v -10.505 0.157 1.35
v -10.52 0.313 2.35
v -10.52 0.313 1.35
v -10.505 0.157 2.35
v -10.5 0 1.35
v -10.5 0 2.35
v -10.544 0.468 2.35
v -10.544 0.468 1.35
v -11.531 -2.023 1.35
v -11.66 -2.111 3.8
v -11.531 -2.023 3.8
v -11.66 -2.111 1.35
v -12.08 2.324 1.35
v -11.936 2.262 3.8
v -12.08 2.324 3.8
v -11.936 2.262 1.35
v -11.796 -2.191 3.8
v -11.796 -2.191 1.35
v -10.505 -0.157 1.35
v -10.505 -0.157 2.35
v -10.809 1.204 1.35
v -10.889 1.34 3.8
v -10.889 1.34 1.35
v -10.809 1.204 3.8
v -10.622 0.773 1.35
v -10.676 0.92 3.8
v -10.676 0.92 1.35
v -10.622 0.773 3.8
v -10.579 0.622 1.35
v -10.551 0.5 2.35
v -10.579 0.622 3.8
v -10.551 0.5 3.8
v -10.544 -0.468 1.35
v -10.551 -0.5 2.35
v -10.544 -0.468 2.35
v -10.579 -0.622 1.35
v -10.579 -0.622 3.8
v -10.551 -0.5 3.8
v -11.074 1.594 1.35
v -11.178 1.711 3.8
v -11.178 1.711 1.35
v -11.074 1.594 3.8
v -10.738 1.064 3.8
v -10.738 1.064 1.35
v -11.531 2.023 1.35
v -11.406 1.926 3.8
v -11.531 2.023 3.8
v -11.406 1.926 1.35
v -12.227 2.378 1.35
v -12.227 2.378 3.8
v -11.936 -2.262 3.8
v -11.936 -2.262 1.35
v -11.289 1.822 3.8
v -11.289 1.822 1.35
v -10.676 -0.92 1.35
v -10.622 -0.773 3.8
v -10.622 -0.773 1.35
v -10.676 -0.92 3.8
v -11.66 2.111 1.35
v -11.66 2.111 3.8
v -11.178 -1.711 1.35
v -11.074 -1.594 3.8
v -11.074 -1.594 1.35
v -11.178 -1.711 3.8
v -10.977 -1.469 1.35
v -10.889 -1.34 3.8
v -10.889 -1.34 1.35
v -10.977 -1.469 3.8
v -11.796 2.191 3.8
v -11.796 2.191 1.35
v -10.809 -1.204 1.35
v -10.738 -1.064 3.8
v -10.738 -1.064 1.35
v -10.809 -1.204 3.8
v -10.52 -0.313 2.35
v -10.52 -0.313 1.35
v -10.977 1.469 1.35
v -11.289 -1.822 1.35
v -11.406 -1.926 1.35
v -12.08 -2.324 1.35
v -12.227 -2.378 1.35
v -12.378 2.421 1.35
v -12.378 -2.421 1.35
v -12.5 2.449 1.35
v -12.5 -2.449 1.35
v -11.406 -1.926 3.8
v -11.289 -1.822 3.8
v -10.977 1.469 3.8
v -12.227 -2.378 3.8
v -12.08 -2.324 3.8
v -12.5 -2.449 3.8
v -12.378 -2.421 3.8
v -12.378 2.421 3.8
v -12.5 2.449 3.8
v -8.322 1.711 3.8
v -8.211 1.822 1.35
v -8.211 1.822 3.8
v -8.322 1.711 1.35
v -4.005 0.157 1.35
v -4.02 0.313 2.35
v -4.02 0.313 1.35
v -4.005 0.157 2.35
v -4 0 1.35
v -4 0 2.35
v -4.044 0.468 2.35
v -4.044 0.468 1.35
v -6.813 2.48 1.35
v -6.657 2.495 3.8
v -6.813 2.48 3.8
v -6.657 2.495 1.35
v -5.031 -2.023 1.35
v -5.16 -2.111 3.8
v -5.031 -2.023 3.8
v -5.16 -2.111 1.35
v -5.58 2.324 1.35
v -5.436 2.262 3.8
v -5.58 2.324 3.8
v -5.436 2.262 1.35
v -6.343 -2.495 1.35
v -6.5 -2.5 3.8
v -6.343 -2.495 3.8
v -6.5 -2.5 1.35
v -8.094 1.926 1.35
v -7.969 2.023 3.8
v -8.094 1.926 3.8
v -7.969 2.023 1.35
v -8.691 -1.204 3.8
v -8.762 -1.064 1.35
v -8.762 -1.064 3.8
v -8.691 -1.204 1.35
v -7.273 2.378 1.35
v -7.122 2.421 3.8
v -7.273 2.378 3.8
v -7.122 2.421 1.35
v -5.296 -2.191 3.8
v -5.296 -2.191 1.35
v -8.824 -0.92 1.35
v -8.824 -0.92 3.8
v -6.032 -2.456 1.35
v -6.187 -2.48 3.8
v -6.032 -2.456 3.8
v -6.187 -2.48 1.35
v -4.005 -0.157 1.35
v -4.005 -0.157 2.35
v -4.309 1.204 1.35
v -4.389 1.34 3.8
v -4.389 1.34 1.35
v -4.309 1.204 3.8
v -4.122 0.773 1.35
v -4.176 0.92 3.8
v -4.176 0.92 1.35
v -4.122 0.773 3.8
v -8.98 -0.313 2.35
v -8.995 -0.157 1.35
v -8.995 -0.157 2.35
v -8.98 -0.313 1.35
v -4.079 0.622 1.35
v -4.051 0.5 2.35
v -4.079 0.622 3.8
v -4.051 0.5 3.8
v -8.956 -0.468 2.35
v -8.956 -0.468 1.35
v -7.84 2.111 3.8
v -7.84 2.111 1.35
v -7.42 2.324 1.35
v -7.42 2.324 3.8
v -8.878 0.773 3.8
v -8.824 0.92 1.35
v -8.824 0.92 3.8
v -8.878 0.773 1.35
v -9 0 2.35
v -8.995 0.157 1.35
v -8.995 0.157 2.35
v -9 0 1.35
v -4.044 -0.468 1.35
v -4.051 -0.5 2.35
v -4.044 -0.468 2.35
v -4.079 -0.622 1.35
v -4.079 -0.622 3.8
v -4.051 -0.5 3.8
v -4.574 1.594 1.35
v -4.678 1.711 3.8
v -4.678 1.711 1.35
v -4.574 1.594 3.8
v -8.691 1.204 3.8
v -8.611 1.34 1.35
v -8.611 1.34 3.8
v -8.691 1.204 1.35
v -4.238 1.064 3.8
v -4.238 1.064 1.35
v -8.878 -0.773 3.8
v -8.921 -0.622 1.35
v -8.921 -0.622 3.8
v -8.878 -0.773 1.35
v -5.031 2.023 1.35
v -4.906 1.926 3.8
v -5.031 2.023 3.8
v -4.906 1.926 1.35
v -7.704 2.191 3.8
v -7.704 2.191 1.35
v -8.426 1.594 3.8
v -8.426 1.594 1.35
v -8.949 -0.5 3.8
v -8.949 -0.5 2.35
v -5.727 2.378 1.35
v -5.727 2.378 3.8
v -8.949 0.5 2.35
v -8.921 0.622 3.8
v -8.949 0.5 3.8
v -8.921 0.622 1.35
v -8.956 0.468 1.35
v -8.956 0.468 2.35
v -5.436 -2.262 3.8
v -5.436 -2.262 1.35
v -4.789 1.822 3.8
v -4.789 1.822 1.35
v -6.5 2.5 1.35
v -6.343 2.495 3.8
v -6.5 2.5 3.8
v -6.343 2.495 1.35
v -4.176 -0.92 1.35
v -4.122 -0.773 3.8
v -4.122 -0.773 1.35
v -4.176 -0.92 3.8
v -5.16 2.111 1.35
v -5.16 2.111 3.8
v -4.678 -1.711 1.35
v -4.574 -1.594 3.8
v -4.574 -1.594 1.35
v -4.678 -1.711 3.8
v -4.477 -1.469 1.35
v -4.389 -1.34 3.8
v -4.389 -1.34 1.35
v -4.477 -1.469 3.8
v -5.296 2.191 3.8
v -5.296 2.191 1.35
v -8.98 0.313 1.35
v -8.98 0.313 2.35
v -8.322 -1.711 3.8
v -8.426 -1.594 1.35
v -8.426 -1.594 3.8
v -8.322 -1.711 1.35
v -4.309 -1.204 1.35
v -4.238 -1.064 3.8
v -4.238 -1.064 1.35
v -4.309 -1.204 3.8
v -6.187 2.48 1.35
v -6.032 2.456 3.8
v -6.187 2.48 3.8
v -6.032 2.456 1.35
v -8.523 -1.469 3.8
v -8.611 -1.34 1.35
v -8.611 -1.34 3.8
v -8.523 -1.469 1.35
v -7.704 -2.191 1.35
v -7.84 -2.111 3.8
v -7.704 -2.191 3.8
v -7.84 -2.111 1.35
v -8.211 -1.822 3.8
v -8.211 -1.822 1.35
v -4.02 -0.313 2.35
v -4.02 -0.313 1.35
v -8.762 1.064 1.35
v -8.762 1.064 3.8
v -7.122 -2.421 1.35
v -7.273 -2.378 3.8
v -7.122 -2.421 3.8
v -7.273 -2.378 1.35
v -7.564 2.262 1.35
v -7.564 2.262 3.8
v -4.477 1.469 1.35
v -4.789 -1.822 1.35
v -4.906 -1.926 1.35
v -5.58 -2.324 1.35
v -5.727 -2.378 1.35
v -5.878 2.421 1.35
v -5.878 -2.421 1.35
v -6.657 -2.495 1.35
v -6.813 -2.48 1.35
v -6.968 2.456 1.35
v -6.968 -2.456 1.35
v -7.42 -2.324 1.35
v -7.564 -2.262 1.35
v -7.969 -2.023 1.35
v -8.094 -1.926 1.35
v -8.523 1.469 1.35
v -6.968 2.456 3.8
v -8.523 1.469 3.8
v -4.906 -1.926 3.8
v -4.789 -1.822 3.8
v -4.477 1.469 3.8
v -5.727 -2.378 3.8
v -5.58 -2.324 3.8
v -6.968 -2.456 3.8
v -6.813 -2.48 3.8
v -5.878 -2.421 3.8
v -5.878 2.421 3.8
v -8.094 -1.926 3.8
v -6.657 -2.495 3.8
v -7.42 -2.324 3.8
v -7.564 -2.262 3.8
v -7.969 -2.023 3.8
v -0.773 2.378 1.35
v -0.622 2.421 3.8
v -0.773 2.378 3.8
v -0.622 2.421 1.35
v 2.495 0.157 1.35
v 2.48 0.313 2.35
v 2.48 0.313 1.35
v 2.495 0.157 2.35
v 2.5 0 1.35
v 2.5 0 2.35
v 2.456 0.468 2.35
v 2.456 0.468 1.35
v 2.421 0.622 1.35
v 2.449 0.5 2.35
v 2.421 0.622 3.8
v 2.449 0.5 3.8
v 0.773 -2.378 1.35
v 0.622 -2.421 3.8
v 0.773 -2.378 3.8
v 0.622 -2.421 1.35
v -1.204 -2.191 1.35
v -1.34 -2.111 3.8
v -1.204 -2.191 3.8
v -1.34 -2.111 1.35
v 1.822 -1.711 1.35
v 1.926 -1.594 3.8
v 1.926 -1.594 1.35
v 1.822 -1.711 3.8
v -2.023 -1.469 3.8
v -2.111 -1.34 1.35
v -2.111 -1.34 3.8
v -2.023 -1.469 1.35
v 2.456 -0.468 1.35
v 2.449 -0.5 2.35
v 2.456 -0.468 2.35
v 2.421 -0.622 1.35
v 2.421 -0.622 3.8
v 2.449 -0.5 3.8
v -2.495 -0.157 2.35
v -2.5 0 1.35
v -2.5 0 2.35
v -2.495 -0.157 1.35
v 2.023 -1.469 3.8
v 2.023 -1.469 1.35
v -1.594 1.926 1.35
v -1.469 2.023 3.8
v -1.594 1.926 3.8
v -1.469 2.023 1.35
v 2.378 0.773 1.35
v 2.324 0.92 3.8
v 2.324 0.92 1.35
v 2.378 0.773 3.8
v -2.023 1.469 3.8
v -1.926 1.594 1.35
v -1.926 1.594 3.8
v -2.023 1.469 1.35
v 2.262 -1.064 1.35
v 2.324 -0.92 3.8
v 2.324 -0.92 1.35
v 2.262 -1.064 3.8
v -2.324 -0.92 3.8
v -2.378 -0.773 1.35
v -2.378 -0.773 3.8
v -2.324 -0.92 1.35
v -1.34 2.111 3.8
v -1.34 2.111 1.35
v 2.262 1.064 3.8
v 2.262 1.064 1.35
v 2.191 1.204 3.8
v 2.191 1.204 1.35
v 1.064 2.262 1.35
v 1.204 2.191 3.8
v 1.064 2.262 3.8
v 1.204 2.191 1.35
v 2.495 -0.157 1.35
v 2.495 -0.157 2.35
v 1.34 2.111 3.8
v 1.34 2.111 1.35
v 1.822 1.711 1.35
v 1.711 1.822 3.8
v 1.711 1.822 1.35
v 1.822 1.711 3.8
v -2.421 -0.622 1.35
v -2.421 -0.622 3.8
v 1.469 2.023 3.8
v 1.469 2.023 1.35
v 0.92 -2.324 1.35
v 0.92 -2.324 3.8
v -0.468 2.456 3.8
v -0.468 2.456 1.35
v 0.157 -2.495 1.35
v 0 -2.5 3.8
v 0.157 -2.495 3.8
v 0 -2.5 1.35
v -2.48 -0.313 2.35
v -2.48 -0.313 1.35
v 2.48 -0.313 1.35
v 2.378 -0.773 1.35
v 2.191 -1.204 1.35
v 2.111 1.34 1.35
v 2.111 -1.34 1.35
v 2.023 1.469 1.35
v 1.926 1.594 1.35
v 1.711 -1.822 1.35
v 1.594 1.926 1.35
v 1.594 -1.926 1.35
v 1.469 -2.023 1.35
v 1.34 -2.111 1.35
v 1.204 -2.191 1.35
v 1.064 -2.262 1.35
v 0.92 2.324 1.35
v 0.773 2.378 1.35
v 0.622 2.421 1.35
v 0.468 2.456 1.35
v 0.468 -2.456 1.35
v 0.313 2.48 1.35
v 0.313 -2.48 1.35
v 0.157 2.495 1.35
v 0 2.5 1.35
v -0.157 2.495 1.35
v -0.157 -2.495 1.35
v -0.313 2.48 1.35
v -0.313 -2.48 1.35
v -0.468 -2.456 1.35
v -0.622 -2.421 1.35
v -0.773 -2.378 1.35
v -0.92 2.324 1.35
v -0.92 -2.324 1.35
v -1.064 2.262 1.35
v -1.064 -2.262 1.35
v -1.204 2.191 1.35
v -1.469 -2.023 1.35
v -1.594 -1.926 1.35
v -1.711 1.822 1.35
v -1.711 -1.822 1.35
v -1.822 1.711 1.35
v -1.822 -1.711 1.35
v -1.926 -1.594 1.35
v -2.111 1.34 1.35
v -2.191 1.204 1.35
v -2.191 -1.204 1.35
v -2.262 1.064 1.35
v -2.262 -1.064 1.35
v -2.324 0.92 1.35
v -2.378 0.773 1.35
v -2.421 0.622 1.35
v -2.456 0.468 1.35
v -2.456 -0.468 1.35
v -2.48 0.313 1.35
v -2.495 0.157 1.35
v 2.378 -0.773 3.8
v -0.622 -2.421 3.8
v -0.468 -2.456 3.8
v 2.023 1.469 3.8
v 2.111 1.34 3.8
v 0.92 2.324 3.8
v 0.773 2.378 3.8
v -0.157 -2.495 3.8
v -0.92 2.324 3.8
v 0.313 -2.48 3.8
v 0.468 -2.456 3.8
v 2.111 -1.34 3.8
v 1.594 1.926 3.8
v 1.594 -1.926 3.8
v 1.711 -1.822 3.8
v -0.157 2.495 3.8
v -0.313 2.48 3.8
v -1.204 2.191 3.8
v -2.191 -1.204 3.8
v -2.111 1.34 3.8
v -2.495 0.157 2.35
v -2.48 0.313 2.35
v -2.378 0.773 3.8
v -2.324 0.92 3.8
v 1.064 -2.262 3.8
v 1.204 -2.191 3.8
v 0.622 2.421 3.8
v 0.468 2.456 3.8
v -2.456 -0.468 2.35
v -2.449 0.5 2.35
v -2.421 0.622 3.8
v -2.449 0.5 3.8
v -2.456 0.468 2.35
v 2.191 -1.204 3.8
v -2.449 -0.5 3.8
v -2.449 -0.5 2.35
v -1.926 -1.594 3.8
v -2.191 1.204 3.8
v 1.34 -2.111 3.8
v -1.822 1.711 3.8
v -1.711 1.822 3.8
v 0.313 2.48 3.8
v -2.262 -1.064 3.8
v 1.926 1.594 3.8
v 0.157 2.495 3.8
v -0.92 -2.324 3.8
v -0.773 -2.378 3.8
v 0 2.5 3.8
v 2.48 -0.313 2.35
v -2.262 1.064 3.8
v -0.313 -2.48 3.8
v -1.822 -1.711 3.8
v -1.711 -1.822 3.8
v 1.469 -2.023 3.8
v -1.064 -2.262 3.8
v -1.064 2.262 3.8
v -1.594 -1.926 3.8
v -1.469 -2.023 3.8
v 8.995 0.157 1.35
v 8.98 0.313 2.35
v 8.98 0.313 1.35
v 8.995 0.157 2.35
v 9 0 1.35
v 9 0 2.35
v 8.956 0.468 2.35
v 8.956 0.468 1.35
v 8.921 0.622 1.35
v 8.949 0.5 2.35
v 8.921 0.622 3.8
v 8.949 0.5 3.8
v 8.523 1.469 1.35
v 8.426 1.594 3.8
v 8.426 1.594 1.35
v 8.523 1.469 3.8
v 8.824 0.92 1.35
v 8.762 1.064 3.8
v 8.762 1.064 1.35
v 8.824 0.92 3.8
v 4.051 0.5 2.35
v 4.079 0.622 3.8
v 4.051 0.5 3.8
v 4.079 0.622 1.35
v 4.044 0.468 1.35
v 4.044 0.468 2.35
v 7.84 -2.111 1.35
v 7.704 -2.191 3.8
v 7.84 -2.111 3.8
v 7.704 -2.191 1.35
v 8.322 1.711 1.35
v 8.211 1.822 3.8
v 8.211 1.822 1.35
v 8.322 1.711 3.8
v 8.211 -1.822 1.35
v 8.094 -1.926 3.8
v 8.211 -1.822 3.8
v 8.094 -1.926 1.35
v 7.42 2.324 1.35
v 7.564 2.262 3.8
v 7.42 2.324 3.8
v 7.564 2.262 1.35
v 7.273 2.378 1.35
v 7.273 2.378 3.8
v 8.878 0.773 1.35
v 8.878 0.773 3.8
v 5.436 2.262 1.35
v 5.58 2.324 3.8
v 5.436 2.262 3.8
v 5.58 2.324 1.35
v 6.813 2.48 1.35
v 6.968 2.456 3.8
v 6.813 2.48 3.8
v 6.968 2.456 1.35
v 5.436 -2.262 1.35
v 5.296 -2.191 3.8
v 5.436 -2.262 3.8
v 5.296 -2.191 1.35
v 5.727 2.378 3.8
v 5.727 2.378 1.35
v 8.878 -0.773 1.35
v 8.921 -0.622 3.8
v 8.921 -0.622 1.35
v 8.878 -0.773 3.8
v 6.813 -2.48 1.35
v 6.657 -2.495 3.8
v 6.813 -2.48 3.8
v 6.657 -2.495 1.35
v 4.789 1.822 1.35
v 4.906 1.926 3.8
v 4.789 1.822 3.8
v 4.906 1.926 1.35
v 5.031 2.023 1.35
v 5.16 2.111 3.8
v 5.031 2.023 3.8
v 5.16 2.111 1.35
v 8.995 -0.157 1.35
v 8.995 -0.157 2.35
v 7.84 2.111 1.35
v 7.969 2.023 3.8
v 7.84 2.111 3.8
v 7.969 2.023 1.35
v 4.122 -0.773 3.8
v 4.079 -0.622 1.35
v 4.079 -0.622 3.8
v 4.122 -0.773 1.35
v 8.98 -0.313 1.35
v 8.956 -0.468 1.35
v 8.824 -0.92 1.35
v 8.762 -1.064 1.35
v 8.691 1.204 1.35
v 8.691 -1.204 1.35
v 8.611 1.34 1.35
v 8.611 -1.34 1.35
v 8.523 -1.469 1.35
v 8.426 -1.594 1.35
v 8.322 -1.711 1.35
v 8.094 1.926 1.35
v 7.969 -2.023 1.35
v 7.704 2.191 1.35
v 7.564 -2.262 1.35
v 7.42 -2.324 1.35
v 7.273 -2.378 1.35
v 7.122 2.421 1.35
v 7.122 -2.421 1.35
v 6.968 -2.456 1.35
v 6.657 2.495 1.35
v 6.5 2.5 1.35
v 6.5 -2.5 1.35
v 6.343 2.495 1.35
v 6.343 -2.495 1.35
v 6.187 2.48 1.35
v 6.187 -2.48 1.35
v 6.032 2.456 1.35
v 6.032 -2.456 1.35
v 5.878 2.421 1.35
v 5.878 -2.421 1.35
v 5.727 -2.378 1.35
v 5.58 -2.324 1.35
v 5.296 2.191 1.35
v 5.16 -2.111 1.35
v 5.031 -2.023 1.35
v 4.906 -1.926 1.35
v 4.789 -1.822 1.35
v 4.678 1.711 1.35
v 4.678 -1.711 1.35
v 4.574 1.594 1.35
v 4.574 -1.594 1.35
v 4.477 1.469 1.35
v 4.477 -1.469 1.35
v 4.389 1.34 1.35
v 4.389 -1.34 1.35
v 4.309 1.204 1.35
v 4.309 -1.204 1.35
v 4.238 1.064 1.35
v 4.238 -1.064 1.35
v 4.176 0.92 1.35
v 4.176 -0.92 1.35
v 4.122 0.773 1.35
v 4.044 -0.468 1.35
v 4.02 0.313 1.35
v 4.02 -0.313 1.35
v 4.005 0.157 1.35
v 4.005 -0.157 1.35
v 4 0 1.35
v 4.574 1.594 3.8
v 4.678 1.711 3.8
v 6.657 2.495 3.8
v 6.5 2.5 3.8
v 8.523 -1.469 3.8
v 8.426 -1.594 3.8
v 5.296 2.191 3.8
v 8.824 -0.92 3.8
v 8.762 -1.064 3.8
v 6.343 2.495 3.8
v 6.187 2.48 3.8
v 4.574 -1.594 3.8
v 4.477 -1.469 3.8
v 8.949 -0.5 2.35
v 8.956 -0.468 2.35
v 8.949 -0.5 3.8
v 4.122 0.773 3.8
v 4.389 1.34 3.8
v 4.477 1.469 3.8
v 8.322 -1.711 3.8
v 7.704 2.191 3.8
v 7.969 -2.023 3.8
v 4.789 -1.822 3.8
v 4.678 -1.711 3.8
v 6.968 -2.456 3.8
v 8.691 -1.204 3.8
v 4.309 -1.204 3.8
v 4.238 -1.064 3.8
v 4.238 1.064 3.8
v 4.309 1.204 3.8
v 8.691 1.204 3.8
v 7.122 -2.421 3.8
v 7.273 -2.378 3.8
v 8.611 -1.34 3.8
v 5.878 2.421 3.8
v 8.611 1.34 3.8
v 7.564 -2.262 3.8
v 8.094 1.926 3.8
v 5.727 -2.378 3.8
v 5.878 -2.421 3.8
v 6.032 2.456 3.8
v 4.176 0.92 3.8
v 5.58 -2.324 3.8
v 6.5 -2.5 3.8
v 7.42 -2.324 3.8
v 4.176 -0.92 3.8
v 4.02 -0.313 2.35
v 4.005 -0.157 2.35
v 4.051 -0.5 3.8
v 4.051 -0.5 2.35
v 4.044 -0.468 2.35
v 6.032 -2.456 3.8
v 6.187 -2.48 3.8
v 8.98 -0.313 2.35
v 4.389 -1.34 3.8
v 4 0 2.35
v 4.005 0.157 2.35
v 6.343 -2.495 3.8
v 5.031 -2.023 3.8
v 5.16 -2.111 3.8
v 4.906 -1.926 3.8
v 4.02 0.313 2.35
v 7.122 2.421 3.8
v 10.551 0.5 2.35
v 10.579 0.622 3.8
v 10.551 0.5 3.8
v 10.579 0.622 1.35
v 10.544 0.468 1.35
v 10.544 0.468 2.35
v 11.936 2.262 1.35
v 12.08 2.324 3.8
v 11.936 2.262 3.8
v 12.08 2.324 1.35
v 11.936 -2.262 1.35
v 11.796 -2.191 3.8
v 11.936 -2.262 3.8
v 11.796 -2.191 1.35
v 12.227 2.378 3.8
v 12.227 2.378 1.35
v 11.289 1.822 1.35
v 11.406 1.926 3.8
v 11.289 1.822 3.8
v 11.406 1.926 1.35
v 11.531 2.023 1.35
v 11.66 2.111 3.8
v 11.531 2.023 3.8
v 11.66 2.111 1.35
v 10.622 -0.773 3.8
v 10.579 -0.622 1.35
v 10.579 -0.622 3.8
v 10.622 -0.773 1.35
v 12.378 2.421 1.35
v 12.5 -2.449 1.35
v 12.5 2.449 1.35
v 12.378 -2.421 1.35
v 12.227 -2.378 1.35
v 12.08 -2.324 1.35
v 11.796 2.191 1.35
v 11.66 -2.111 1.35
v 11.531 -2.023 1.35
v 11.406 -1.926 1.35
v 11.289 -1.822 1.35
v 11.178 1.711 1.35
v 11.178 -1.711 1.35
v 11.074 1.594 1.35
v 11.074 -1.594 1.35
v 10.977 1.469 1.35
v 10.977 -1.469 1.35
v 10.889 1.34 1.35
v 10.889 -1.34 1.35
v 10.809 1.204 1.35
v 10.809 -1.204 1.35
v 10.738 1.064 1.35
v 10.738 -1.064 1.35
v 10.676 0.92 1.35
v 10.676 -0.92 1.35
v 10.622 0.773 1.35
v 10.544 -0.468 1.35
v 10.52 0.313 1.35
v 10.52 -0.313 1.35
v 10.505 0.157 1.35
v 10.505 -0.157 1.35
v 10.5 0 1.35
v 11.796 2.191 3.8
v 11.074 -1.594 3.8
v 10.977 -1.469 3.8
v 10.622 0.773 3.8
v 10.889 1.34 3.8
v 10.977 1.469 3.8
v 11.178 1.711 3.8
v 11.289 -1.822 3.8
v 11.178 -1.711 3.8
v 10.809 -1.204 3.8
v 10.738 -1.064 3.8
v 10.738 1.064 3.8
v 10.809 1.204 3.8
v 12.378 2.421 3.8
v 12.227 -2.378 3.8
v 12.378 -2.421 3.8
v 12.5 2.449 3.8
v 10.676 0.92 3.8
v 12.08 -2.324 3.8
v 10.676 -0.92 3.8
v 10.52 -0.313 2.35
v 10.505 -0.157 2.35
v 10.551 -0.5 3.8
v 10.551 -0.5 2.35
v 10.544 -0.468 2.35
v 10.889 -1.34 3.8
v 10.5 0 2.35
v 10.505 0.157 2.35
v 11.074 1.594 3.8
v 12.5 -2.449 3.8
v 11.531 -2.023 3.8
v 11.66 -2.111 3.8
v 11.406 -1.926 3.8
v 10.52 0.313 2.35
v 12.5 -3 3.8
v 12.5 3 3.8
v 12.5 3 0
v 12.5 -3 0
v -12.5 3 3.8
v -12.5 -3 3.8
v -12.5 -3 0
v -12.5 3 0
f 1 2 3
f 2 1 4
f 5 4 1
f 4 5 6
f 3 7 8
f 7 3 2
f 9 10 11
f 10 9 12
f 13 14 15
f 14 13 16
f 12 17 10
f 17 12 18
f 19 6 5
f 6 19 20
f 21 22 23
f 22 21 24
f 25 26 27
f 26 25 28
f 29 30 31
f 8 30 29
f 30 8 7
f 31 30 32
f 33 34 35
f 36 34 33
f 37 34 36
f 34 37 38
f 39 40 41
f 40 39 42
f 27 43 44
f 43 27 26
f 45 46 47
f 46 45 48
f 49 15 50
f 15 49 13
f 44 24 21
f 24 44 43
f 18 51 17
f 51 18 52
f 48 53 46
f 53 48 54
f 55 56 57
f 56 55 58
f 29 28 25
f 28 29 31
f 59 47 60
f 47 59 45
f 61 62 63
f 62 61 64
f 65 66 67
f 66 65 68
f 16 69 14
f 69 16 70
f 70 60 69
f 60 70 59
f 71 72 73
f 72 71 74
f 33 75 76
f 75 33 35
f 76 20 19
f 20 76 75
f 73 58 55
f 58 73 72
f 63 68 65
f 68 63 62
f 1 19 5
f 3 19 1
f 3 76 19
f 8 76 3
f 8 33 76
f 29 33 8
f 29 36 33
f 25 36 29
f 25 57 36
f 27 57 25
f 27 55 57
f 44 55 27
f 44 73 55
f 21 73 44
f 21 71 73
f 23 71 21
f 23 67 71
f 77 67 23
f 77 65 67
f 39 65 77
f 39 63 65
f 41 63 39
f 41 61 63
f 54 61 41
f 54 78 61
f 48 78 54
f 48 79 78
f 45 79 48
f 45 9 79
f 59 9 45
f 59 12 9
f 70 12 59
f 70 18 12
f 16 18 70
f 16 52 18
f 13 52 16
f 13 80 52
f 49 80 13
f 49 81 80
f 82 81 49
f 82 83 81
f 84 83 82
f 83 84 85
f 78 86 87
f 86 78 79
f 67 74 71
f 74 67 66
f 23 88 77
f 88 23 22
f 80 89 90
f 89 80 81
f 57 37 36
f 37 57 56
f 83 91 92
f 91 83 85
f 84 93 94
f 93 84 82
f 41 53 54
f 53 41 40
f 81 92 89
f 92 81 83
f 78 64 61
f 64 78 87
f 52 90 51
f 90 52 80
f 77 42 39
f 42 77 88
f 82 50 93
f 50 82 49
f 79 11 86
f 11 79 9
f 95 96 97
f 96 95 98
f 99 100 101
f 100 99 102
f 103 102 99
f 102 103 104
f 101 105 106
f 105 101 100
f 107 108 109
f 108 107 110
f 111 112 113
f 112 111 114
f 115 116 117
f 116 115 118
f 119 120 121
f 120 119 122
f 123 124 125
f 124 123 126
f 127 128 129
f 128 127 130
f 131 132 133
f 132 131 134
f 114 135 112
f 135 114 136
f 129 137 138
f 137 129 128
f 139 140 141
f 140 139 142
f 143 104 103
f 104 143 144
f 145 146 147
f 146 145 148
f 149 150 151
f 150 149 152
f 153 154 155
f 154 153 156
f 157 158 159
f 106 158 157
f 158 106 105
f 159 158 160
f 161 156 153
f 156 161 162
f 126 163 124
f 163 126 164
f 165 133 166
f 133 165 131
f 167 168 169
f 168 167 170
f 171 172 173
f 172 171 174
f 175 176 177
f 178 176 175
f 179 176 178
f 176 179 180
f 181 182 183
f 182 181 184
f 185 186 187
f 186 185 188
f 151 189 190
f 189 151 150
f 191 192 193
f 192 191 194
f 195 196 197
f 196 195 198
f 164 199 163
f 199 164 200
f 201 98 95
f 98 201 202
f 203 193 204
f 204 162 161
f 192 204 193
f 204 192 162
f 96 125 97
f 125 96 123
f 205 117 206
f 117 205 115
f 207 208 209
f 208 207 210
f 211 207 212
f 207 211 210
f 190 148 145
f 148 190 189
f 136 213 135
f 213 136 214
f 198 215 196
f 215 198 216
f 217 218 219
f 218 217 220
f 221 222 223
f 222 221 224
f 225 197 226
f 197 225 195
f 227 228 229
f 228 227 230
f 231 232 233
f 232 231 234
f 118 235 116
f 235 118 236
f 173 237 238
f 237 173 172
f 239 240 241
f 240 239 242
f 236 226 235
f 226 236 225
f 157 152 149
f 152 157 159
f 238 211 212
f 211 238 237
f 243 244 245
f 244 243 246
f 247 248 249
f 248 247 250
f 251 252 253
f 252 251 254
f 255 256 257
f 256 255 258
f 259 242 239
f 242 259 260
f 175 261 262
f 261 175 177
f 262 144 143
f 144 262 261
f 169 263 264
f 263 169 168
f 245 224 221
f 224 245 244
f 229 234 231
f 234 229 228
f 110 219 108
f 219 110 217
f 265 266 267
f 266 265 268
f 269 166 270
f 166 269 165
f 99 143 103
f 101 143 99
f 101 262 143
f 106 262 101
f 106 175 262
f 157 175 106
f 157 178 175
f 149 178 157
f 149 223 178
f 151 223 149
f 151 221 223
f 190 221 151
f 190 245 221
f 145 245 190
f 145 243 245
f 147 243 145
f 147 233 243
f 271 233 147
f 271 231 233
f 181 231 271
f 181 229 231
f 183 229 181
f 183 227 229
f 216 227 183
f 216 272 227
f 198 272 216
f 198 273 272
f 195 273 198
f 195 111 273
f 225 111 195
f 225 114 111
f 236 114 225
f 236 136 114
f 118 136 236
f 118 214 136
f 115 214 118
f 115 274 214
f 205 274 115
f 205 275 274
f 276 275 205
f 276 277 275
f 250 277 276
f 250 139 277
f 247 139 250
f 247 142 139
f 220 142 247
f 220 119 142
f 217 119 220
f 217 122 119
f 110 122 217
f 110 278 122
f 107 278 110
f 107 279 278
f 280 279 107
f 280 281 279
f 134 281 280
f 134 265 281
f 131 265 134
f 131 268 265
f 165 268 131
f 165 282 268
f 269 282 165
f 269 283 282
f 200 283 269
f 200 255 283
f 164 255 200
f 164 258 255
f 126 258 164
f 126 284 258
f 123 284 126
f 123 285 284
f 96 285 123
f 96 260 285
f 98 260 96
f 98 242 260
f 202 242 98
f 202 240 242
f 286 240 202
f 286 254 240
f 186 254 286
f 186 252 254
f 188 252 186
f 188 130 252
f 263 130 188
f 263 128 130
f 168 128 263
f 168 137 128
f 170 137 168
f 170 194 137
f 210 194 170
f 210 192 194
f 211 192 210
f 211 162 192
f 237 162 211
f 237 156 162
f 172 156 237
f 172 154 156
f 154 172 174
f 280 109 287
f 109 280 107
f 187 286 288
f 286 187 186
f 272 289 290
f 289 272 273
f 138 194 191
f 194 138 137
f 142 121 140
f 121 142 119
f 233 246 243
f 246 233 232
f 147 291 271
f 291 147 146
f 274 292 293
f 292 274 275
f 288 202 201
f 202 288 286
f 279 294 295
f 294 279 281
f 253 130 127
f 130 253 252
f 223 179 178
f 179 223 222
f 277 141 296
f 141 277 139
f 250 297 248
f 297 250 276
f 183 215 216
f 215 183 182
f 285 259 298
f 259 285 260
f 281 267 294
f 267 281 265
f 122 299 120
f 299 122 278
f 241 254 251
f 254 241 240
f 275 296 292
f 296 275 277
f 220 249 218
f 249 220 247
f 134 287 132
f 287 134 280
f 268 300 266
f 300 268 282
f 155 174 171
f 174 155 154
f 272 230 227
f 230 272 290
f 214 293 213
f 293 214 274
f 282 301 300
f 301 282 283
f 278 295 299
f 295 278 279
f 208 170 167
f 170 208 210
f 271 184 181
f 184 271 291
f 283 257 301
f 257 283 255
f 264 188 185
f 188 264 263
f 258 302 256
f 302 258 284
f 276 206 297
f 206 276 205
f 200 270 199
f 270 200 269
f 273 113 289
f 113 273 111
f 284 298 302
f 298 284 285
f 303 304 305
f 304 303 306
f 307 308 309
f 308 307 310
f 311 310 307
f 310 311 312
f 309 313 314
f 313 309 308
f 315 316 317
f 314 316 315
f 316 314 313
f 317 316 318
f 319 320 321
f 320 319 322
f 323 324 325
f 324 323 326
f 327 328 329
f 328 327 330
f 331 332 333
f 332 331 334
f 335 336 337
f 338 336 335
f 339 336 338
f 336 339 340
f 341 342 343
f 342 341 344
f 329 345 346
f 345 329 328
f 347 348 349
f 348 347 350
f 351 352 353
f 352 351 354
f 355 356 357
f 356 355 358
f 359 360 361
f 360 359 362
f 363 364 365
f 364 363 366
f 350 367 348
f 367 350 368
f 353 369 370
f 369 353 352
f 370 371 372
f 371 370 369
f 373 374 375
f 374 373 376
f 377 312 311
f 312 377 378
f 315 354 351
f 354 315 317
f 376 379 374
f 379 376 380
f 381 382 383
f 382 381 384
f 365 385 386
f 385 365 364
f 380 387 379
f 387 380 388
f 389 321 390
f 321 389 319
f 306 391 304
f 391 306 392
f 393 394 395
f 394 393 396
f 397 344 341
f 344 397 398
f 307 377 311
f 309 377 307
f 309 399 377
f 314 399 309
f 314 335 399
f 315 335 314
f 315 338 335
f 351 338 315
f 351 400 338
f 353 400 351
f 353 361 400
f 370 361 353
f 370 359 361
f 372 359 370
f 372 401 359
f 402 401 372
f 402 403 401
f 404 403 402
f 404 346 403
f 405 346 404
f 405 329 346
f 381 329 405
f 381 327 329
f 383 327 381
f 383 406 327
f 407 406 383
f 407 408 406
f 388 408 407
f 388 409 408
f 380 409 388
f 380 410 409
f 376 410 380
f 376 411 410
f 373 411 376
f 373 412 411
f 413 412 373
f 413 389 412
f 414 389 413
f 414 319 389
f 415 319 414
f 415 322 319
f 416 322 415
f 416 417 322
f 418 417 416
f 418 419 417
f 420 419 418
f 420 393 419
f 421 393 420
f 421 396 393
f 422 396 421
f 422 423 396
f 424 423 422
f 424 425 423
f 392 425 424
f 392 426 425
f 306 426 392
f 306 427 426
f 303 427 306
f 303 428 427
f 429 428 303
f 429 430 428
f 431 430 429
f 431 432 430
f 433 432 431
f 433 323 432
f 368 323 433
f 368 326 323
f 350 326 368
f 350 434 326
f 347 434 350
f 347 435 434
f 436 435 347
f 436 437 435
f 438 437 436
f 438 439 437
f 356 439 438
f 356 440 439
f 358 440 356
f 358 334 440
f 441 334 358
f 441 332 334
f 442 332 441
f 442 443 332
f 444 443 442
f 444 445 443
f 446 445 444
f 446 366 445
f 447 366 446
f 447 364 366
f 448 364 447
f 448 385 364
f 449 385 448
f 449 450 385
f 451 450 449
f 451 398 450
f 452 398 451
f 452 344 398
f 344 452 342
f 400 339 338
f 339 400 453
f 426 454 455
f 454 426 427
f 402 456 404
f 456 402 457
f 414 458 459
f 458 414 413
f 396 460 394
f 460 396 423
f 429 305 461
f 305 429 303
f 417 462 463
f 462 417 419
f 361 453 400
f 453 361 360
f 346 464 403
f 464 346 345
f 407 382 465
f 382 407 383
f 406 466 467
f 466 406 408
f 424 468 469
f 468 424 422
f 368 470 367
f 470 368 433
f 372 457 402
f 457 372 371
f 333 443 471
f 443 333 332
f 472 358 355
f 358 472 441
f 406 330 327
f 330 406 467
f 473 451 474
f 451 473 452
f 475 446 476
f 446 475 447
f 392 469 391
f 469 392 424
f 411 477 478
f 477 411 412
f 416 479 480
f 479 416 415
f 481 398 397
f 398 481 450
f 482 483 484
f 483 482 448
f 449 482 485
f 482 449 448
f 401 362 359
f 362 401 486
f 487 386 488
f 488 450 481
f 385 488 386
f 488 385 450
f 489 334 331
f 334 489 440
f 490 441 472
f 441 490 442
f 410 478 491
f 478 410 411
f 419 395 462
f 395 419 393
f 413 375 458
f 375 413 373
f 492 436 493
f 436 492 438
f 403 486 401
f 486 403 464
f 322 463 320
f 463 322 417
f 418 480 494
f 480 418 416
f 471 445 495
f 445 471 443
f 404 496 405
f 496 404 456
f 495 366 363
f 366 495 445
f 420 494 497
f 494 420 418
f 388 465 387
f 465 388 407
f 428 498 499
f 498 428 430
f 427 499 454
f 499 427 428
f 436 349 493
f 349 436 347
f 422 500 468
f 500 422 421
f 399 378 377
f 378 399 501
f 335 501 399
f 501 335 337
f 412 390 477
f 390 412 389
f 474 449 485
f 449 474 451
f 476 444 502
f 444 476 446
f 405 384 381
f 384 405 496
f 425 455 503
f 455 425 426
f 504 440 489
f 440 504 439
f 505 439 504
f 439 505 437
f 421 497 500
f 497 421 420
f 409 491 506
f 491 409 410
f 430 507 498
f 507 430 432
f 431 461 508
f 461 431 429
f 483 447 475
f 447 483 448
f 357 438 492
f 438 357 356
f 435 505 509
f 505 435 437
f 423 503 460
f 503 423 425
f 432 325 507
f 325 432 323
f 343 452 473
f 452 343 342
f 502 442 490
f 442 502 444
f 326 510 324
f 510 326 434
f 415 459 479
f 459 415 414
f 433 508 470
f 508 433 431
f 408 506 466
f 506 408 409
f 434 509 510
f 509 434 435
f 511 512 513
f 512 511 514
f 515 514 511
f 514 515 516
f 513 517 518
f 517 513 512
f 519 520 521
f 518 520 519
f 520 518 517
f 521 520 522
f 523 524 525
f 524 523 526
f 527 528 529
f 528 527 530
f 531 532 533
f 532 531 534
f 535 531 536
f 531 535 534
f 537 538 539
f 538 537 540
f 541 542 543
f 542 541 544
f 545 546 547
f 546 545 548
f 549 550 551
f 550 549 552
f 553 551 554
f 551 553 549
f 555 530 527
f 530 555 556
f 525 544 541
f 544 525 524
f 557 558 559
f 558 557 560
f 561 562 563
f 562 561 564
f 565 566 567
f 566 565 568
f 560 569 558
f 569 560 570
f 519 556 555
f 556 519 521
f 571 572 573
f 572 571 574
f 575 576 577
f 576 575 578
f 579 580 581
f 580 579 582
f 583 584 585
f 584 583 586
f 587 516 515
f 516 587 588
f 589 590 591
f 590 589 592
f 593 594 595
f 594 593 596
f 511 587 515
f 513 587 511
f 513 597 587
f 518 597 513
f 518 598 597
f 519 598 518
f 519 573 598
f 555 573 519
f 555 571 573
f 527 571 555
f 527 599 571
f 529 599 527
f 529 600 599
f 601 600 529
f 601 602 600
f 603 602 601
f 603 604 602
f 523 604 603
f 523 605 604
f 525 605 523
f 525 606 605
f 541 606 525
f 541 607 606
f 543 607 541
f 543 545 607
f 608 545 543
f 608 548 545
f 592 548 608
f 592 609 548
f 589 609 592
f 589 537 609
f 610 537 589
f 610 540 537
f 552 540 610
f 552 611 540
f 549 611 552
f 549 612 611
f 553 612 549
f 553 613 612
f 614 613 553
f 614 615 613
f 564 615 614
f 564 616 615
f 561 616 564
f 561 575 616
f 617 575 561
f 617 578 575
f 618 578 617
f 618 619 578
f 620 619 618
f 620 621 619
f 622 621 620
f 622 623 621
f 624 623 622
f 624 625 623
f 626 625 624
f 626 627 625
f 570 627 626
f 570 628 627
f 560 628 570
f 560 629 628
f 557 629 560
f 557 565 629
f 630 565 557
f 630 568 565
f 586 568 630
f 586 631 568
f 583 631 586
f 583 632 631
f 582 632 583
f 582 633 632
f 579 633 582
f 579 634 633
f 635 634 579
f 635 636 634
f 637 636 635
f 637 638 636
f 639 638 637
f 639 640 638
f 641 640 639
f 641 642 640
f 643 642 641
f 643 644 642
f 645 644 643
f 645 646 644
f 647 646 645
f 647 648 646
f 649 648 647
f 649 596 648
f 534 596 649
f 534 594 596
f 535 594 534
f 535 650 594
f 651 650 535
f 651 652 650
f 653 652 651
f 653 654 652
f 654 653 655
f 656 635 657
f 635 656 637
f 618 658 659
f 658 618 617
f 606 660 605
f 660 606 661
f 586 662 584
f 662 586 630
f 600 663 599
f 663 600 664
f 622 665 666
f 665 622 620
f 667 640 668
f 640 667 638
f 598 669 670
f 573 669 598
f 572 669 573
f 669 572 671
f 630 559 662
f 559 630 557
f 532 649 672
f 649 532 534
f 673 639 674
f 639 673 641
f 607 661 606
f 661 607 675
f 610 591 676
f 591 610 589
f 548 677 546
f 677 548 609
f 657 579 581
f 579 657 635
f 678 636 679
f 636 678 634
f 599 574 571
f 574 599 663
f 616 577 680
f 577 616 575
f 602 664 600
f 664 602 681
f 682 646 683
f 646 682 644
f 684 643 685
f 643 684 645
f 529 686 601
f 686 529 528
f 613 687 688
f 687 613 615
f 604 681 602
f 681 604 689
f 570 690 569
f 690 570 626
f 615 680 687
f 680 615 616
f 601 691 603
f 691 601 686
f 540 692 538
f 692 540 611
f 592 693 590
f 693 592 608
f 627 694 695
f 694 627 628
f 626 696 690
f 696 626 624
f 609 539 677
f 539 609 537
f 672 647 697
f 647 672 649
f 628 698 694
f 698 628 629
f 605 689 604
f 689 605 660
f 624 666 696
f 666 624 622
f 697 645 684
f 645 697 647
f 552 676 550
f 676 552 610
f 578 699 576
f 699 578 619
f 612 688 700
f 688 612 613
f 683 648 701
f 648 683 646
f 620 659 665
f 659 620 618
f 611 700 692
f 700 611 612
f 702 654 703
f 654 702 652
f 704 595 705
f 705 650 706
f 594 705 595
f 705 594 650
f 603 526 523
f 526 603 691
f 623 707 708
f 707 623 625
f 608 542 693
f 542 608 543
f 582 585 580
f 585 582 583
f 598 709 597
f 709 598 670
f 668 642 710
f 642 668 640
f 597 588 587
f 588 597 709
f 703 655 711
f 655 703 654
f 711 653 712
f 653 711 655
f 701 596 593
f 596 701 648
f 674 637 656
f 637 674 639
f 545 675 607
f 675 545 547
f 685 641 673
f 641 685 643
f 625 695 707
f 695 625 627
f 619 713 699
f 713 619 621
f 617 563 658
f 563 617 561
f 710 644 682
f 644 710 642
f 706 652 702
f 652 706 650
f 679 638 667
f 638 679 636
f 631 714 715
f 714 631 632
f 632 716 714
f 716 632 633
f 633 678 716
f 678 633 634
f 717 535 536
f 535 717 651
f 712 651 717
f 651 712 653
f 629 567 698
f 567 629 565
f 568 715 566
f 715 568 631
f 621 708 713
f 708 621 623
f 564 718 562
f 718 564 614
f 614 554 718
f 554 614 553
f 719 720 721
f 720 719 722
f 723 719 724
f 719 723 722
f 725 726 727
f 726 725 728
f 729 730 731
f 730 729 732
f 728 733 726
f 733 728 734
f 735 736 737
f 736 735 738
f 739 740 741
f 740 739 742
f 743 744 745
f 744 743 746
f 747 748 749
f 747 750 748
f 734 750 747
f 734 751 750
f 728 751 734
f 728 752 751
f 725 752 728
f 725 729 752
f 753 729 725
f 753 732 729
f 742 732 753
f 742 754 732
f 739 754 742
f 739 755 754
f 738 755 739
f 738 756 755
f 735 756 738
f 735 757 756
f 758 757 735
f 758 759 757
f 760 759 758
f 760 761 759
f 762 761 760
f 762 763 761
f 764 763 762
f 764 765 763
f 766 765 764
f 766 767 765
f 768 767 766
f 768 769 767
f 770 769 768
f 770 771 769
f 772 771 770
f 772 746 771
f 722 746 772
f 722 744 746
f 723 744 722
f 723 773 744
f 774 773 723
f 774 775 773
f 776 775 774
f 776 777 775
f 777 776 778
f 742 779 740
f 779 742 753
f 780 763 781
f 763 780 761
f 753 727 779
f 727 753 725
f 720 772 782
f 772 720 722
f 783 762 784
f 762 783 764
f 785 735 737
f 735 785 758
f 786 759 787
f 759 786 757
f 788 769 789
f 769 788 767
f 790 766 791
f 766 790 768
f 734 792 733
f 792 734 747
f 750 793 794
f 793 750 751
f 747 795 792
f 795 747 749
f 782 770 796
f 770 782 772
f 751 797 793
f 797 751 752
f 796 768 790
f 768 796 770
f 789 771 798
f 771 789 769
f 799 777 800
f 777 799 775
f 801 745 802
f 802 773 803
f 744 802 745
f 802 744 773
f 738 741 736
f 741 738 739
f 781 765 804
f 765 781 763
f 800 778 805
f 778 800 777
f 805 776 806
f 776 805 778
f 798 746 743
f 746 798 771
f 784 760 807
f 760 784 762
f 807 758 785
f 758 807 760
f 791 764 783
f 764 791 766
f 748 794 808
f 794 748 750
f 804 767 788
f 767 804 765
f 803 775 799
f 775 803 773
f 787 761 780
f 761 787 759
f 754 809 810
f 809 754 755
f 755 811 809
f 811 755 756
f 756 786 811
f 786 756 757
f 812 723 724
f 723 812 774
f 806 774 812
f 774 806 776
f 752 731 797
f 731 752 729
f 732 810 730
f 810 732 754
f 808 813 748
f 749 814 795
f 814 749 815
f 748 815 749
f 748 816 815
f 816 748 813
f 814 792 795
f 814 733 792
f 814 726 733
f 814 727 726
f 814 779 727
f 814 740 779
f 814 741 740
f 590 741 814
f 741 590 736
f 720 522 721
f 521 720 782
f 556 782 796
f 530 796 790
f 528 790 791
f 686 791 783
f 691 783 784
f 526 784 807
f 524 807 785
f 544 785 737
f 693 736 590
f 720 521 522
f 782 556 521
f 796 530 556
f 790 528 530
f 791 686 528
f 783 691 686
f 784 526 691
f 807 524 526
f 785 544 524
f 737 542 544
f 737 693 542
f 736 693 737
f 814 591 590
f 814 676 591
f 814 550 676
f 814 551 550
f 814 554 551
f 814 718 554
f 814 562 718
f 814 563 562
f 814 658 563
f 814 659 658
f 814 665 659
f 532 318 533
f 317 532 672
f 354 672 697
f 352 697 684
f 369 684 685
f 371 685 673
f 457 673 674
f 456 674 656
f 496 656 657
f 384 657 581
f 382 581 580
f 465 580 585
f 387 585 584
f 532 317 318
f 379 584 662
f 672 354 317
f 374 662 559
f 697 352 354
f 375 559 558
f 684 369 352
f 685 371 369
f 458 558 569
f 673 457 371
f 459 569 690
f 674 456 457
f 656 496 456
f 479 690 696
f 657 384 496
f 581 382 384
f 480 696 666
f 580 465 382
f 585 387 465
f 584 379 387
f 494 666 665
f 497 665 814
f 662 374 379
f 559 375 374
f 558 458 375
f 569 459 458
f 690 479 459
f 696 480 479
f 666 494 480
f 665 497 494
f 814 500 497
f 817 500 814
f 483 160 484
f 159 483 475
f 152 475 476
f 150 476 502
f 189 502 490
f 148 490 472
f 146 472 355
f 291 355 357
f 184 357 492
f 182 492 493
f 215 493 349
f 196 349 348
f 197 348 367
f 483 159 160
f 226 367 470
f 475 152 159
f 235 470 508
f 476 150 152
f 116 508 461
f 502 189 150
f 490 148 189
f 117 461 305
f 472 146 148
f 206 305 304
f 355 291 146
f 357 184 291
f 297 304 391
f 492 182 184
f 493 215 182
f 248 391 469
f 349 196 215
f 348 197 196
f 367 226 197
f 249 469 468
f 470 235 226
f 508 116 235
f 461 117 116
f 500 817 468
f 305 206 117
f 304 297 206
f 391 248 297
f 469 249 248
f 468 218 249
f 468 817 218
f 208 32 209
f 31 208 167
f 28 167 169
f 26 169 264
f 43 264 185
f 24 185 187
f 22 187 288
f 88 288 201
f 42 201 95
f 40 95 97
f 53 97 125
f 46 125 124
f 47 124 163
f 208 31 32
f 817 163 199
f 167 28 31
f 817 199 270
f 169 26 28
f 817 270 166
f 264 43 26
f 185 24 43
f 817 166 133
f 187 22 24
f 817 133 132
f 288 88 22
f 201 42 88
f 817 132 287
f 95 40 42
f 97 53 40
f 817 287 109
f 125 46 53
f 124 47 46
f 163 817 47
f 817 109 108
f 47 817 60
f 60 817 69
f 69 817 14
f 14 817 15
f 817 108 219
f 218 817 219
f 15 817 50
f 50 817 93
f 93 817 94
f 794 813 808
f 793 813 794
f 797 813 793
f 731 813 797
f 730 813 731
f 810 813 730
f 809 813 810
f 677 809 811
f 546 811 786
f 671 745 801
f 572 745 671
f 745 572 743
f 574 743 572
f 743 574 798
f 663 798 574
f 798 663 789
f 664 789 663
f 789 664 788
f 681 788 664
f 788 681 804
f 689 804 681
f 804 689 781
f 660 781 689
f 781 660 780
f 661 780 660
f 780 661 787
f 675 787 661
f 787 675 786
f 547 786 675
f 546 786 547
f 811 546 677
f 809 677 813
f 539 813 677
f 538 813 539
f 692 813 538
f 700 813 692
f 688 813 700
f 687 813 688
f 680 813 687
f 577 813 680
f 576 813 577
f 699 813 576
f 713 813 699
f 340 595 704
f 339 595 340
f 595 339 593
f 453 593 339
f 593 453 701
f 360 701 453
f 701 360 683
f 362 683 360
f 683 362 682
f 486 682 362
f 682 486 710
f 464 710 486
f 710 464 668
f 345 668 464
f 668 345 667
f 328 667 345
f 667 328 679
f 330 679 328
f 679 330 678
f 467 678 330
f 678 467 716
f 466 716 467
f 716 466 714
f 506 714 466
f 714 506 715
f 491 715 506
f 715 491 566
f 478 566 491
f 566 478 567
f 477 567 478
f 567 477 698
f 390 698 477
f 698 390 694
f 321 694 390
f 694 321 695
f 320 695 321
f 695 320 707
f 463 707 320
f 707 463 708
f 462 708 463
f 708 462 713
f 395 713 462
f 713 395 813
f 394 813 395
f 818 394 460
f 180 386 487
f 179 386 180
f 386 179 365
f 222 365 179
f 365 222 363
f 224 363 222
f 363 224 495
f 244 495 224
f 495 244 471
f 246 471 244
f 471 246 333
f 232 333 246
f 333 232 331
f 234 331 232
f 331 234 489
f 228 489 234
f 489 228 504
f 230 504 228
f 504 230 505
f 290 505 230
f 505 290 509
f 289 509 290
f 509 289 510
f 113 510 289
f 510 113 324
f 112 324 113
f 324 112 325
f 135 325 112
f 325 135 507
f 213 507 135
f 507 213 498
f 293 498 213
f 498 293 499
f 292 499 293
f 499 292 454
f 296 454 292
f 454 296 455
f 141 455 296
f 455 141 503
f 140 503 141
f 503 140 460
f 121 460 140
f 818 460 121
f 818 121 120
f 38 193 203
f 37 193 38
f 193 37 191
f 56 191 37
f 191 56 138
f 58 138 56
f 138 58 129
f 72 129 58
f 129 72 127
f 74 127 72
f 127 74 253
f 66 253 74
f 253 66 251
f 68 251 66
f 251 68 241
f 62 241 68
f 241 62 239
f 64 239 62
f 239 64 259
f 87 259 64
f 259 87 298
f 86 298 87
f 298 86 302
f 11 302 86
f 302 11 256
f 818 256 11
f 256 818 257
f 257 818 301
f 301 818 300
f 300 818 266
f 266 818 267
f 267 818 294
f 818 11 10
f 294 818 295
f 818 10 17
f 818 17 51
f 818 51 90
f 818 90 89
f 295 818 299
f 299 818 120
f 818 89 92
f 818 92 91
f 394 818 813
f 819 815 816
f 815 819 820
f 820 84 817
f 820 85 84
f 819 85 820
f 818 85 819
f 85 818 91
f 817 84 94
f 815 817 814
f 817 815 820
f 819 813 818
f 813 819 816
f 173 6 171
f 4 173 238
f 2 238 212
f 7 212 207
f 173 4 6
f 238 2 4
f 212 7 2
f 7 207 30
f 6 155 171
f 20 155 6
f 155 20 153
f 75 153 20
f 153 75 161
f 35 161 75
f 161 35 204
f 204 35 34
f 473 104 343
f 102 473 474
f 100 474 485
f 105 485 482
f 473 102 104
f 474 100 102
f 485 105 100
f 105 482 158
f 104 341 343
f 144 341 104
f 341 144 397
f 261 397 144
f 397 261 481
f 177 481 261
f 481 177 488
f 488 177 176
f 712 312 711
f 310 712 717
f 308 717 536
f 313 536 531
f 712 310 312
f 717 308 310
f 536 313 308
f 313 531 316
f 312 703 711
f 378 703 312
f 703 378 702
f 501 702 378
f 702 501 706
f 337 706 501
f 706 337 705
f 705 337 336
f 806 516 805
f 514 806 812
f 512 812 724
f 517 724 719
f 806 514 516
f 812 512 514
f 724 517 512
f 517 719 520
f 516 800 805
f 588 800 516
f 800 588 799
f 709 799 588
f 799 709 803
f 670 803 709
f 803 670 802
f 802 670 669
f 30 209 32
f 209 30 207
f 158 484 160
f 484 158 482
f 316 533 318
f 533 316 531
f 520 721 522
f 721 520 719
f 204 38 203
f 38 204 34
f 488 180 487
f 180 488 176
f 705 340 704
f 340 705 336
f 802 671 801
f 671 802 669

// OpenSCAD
// file: servo.scad
$fn=100;

module mounts(l,radius,m_dx,m_dy=0)
{
	for(i=[-1,1]) for(j=[-1,1]) translate([i*m_dx/2,j*m_dy/2,0]) cylinder(r=radius,h=l,center=true);
}

module servo(shell=false)
{
	body = [ 42, 20.5, 40 ];
	body_shell = [ 44, 21.5, 40 ];
	
	flange = [ 56, 20.5, 2.5 ];
	fh = 30.0;
	
	m_d = 50.0;
	
	difference()
	{
		cube(flange,center=true);
		if(!shell) mounts(body[2],2.25,m_d,10);
	}
	if(shell) mounts(body[2],2.25,m_d,10);
	
	translate([0,0,body[2]/2-fh]) cube(shell?body_shell:body,center=true);
	
	translate([11,0,body[2]-fh]){ cylinder(r=6,h=1.5); cylinder(r=3,h=5); }
}

module 9g_servo(shell=false)
{
	body = [ 23.28, 12.5, 23.3 ];

	flange = [ 33.28, 12.5, 2.36 ];
	fh = 17.62;
		
	m_d = 27.78;
	
	difference()
	{
		cube(flange,center=true);
		for(i=[-1,1]) translate([i*(1.5+m_d/2),0,0]) cube([3,1,flange[2]*2],center=true);
		if(!shell) mounts(body[2],1,m_d);
	}
	if(shell) mounts(body[2],1,m_d);
	
	translate([0,0,body[2]/2-fh]) cube(body,center=true);
	
	translate([5.82,0,body[2]-fh]){ cylinder(r=6,h=3.75); cylinder(r=2.455,h=6.5); }	
}

module servo_mount()
{
	difference()
	{
		translate([1,0,2]) cube([60,32,4],center=true);
		translate([0,0,6]) servo(true);
	}
	
	translate([30.5,0,10])
	{
		difference()
		{
			cube([4,32,20],center=true);
			for(i=[-1,1]) for(j=[-1.25,-1,-0.75,0.75,1,1.25])
				translate([-3.5,i*8,j+2]) rotate([0,90,0])
				{
					cylinder(r=3.5,h=6,$fn=6,center=true);
					cylinder(r=1.5,h=20,center=true);
				}
		}
		translate([0,0,-6]) intersection()
		{
			rotate([0,45,0]) cube([17.5,32,17.5],true);
			for(i=[-1,1]) translate([-7,i*14,7]) cube([17.5,4,17.5],true);
		}
	}

	for(i=[-1,1]) translate([1,14.5*i,5.5]) cube([60,3,3],center=true);
}

servo_mount();
% translate([0,0,6]) rotate([0,180,0]) servo();
//% 9g_servo();
// main file
$fn=100;

use <servo.scad>

bead_r = 2.5;

module wheel()
{
	s_thick = 1.5;
	s_gap = 1;
	
	radius = 25;
	
	module slice(cut=false)
	{
		grooves = 22;
		bead_d = 21.5;
	
		te = (6.28*radius/grooves-0.5)/2; re = radius-bead_d;
	
		difference()
		{
			circle(r=radius);
			for(i=[0:grooves-1]) rotate(a=i*360/grooves) translate([0,bead_d,0])
			{
				circle(r=bead_r);
				polygon(points=[[bead_r,0],[-bead_r,0],[-te,re],[te,re]]);
			}
			difference(){ circle(r=radius); circle(r=radius-0.25); }
			if(cut){ difference(){ circle(r=radius); circle(r=bead_d); } }
		}
	}
	
	translate([0,0,s_thick])
	{
		translate([0,0,bead_r-s_gap]) linear_extrude(s_gap) slice(true);
		linear_extrude(bead_r-s_gap) slice();
	}
	cylinder(r=radius,h=s_thick);
}

module wheel_assembly(spokes=12,bore=6)
{
	holes = [10,16];
	difference()
	{
		wheel();
		cylinder(r=bore,h=10,center=true);
		for(i=[0:spokes-1]) rotate(a=i*360/spokes) for(j=holes) translate([0,j,0]) cylinder(r=1,h=10,center=true);
	}
}

module limit_trigger()
{
	bead_d = 6.5;
	difference()
	{
		translate([0,0,1.9]) cube([25,6,3.8],center=true);
		translate([0,0,3.1]) cube([25,1,1.5],center=true);
		for(i=[-2,-1,0,1,2]) translate([bead_d*i,0,1.35]) cylinder(r=bead_r,h=bead_r);
	}
}

module rail_mount()
{
	length = 70;
	mount = [length,29.5,17];
	module rail_clasp()
	{
		rail_d = 14; // distance between rails
		
		rail = [length+1,2.5,12];
		
		difference()
		{
			cube(mount,center=true);
			for(i=rail_d/2*[-1,1])
			{
				translate([0,i,(mount[2]-rail[2])/2+0.01]) cube(rail,center=true);
				for(j=[-1,1]) translate([j*((length-rail[2])/2+1),i,0])
					rotate([0,90,0]) cube(rail,center=true);
			}
			translate([0,0,6.5]) cube([length+1,rail_d,6],center=true);
		}
	}
	
	translate([0,mount[1]/2,0]) cube([length,2,mount[2]],center=true);
	
	difference()
	{
		rail_clasp();
		for(i=[-3,-1,1,3]) translate([i*10,0,0]) cylinder(r=2.5,h=30,center=true);
	}
	
	difference()
	{
		translate([0,18,6.5]) cube([length,6,30],center=true);
		for(i=[-3,-1,1,3]) for(j=[-1,0,1])
			translate([i*8,13.5,14]) rotate([90,0,0])
			{
				cylinder(r=3.5,h=10,$fn=6,center=true);
				cylinder(r=1.5,h=20,center=true);
			}
	}
}

limit_trigger();

//for(i=[-1,1]) translate([0,5*i,26]) rotate([90*i,0,0]) wheel_assembly();
//translate([0,-30,8.5]) rail_mount();
